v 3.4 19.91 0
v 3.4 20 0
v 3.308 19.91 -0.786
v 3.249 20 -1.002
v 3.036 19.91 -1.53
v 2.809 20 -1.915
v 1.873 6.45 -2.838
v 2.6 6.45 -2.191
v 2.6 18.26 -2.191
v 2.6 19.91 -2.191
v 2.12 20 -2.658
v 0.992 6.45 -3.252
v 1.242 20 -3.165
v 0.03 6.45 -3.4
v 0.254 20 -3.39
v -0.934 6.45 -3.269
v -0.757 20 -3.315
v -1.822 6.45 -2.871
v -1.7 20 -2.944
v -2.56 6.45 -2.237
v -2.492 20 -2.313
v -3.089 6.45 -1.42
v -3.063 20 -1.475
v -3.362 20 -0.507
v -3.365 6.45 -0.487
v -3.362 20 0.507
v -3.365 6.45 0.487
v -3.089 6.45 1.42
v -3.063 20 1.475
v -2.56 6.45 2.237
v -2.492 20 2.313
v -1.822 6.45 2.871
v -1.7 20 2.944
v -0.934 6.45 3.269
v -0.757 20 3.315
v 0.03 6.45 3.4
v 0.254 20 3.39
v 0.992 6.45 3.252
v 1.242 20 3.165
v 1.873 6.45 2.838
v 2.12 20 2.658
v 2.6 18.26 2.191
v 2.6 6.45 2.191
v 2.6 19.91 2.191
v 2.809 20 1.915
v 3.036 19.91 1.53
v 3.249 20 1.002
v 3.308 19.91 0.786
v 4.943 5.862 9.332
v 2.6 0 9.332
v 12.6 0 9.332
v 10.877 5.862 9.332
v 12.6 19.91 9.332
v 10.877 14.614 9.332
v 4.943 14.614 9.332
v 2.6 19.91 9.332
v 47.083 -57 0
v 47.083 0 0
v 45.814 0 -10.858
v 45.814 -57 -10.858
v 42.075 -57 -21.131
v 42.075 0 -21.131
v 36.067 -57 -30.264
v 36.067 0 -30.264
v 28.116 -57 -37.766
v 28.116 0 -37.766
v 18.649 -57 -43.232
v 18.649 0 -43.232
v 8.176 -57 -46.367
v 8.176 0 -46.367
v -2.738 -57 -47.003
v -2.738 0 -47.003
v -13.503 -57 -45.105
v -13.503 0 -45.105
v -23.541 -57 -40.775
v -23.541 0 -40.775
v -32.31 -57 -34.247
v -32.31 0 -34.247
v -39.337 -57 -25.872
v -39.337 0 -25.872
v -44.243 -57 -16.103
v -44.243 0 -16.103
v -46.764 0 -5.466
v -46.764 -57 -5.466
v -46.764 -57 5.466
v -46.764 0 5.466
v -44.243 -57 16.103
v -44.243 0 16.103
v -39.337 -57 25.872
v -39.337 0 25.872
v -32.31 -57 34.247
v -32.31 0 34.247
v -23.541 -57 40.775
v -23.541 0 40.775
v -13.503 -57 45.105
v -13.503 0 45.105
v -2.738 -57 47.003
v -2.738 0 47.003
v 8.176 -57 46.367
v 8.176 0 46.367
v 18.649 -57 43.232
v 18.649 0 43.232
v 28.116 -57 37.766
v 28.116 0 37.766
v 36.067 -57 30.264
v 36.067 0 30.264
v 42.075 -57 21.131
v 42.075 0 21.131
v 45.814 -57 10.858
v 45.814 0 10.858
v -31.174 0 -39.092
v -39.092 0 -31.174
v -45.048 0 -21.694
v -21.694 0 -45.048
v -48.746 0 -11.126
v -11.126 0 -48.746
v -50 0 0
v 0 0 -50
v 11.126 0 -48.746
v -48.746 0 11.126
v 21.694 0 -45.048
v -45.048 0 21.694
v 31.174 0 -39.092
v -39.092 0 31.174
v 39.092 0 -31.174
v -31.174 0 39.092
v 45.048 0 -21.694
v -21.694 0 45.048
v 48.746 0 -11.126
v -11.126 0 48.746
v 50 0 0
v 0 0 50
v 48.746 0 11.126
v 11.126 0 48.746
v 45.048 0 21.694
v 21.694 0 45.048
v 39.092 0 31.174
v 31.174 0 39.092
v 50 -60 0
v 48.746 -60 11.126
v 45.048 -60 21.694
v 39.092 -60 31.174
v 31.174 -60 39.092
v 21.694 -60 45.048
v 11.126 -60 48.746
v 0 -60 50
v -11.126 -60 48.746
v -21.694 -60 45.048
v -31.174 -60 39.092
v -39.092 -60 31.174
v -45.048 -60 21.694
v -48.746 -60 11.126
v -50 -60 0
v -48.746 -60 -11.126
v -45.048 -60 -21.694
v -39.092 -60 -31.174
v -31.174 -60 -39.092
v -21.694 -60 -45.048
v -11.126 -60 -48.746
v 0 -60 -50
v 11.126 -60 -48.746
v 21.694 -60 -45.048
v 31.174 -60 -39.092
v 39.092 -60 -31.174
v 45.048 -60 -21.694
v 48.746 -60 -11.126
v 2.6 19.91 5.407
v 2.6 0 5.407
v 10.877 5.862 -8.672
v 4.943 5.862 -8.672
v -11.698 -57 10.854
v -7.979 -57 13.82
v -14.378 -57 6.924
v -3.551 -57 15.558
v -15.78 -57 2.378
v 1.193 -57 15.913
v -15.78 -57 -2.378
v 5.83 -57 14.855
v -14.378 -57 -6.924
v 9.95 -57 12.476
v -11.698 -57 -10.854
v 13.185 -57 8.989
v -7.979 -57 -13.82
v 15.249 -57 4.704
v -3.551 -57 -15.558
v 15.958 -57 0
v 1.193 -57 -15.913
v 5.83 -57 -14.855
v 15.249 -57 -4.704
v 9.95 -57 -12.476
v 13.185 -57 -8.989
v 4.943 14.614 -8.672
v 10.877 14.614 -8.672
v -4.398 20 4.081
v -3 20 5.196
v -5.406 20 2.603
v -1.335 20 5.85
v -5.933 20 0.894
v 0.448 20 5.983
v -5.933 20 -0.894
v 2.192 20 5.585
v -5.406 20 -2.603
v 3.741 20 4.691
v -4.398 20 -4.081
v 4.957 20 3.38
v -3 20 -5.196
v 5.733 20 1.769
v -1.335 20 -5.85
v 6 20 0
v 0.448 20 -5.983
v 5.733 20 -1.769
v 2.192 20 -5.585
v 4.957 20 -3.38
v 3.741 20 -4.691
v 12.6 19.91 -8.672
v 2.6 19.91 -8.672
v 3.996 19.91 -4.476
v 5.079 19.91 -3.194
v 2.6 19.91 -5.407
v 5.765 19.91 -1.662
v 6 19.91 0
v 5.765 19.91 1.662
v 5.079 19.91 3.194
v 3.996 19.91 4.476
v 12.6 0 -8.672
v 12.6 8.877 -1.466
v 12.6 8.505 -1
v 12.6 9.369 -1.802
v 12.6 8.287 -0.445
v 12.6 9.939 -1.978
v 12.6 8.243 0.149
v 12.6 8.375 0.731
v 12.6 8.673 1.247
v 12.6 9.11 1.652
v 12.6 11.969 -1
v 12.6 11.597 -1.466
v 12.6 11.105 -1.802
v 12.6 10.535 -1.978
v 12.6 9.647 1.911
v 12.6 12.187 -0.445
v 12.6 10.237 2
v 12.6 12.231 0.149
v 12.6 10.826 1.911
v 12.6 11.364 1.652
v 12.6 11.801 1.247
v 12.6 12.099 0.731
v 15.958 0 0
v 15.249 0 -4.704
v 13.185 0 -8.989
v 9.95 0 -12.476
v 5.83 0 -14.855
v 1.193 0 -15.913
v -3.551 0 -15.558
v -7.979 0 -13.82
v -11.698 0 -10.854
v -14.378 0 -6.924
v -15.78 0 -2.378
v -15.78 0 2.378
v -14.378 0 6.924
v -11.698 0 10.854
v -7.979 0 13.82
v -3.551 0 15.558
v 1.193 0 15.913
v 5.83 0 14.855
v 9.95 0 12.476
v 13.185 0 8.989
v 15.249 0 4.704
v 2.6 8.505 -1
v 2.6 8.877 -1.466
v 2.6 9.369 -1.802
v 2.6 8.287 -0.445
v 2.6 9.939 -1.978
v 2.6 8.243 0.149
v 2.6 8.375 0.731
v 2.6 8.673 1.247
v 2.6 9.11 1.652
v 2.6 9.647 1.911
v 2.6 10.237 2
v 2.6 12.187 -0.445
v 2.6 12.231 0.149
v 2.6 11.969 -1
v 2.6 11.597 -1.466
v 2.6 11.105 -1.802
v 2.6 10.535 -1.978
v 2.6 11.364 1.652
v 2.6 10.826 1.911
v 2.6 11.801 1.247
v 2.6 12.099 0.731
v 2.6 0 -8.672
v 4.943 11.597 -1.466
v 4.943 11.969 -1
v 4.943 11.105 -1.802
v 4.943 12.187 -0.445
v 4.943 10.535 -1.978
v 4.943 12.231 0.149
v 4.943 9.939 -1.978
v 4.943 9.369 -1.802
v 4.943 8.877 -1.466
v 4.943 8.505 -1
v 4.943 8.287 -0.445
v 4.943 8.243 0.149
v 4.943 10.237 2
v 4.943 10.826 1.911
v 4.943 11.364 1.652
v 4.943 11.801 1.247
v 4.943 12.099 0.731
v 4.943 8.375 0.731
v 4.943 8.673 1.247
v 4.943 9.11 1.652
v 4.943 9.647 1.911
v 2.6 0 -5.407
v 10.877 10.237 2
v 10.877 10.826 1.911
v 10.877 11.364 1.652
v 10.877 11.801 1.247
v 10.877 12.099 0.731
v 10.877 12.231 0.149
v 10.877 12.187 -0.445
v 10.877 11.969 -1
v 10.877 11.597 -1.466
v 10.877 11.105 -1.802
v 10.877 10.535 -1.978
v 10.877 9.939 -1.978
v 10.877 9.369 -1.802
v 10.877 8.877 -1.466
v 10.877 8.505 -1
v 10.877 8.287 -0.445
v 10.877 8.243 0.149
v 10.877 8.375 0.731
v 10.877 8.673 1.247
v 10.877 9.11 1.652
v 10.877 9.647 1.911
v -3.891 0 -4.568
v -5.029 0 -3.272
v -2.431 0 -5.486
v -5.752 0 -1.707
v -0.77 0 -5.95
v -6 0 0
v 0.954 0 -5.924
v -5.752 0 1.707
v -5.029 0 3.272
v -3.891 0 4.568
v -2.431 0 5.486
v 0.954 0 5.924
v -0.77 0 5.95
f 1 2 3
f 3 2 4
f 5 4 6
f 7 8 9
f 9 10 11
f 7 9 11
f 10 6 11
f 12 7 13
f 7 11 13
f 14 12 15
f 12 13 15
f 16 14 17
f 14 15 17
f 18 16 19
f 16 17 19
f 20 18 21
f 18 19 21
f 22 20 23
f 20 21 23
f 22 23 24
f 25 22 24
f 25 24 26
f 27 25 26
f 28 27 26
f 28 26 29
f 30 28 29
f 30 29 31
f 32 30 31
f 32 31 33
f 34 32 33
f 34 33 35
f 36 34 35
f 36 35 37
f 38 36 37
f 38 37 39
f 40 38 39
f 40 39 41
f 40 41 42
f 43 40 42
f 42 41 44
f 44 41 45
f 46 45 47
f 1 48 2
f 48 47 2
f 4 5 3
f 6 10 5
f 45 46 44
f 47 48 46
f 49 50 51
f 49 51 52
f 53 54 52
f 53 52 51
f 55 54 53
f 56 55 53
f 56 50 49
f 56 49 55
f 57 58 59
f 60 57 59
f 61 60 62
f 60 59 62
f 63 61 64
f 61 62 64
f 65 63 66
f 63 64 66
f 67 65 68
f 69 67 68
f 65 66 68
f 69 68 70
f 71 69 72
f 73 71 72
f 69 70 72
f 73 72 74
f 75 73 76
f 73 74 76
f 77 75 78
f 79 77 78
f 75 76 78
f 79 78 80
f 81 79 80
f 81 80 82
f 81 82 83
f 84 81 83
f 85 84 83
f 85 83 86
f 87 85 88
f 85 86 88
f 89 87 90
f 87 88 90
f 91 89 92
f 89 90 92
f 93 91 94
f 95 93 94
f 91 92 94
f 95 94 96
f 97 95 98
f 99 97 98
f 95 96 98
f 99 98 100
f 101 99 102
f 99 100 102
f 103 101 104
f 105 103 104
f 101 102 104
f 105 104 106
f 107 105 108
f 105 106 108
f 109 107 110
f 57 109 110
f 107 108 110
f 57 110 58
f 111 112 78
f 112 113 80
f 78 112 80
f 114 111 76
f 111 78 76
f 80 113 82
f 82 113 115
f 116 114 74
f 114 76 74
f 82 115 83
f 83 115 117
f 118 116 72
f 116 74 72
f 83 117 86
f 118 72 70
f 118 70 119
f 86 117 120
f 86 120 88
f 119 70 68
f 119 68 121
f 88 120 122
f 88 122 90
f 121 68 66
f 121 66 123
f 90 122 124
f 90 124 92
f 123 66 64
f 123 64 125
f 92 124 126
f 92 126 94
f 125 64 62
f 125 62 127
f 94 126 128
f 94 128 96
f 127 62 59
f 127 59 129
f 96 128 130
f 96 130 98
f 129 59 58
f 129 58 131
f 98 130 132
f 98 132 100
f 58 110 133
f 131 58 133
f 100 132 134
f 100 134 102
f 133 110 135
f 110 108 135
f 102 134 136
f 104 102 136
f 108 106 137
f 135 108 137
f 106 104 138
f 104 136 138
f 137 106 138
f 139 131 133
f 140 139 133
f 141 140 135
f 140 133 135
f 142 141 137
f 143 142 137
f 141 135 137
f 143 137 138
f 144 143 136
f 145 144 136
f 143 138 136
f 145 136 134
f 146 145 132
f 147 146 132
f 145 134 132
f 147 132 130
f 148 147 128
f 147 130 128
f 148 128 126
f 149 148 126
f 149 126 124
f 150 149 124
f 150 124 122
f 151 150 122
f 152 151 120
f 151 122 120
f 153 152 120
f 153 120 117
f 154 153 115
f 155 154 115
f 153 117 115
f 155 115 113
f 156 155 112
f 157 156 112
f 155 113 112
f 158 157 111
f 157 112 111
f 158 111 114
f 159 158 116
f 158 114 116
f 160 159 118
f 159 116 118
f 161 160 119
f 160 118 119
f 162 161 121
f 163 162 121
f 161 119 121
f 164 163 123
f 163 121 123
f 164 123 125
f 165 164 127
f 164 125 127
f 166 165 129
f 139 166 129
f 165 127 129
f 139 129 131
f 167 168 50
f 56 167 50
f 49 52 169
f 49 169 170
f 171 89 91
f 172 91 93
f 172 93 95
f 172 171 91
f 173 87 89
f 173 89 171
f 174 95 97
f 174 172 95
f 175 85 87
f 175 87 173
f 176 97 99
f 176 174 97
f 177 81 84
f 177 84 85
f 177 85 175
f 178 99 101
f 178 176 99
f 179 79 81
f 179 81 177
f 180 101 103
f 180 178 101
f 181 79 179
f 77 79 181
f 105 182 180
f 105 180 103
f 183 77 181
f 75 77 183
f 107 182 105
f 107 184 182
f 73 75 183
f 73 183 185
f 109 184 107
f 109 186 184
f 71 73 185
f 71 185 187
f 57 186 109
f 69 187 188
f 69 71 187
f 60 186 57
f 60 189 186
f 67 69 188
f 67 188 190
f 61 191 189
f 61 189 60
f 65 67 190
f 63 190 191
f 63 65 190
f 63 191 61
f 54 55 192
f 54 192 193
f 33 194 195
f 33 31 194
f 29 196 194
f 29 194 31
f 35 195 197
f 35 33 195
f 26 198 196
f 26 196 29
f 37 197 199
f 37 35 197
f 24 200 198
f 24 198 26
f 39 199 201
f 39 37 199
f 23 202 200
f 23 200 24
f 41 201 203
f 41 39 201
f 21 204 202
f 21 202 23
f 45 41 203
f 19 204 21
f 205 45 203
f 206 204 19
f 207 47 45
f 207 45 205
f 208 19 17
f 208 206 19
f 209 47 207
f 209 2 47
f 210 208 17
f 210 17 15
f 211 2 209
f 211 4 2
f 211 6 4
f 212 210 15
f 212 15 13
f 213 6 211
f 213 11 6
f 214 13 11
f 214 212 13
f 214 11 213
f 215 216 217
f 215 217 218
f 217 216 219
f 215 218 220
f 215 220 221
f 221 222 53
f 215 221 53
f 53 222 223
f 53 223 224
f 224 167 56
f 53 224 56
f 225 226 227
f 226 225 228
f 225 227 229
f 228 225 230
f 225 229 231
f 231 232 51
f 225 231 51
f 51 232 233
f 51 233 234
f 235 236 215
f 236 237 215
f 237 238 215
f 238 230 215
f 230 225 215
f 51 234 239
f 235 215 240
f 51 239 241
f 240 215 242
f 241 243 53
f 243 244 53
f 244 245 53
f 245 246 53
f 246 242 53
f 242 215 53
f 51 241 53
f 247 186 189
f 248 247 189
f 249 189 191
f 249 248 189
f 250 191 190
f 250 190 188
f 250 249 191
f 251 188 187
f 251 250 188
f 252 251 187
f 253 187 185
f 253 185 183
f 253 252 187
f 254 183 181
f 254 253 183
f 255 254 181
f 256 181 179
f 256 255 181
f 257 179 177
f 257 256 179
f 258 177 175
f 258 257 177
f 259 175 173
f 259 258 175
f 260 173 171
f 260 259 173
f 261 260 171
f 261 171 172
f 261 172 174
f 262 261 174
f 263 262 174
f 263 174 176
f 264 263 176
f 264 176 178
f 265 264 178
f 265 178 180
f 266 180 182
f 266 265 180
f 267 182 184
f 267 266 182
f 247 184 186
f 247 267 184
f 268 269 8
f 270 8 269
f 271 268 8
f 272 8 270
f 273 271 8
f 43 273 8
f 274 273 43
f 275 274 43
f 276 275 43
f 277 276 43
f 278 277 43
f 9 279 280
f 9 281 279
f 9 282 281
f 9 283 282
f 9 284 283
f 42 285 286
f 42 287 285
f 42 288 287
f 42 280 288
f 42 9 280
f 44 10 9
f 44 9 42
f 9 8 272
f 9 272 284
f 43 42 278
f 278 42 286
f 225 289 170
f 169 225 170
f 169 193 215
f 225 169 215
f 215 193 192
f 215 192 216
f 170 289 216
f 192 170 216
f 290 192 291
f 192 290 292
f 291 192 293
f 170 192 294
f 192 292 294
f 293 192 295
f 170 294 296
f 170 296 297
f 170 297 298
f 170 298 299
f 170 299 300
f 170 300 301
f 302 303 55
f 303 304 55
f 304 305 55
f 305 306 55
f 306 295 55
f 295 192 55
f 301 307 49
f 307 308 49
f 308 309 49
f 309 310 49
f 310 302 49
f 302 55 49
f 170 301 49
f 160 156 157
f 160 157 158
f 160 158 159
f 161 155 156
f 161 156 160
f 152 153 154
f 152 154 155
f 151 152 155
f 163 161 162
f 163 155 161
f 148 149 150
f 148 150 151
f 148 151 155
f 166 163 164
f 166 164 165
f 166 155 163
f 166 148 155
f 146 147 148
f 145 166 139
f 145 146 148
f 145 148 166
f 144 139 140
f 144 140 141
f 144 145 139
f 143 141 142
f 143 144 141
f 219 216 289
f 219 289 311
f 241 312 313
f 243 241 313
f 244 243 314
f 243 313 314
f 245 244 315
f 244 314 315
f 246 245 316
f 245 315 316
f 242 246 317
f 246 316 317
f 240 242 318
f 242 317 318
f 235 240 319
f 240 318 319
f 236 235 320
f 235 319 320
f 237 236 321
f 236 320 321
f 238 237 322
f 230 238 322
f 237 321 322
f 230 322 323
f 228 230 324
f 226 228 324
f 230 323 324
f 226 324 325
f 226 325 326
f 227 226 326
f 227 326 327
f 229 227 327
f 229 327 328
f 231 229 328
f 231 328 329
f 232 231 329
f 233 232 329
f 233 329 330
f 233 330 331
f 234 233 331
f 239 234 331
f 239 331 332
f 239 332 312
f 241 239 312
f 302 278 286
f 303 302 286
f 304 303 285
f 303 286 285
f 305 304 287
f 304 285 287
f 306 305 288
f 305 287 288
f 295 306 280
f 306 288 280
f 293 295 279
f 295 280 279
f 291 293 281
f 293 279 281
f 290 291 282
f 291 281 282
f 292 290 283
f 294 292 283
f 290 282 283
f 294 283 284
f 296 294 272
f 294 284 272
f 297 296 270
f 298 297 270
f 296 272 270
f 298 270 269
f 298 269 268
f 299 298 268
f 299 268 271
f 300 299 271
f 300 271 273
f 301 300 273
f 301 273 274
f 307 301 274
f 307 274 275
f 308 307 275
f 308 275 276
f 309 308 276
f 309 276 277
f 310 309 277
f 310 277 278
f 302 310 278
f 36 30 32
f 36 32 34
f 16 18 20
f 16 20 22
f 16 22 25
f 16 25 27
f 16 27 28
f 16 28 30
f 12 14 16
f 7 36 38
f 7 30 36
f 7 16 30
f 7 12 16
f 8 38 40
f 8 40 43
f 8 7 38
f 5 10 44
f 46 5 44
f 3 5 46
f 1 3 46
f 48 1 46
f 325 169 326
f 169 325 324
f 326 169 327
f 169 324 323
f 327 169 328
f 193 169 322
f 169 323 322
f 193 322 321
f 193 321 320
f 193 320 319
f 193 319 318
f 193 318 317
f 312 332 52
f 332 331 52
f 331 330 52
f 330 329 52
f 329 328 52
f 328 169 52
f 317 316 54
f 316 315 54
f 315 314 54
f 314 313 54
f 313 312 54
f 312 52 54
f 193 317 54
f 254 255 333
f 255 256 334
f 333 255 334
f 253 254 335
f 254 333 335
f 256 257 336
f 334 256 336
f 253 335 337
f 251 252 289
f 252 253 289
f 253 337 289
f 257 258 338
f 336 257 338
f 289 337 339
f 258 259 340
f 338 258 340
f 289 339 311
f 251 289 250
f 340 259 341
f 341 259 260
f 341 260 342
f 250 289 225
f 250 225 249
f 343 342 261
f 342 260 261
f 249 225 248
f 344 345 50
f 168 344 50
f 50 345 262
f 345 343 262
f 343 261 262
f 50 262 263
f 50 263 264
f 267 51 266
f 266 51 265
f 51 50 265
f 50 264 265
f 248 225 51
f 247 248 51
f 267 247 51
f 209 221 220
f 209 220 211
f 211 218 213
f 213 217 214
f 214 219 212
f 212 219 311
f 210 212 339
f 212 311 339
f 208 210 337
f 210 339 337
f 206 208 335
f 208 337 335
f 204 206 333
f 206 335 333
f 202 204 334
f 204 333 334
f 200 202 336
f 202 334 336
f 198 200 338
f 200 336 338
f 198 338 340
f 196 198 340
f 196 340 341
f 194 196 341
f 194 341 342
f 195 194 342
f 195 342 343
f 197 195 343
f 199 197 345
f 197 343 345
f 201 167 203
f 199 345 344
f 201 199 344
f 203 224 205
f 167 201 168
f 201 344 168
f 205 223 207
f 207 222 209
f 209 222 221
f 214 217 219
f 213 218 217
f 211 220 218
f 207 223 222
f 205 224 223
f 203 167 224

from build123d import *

# Parameters (mm, degrees)
SKETCH1_R               = 6
BOSS_EXTRUDE1_DEPTH     = 20
SKETCH2_R               = 3.4
CUT_EXTRUDE1_DEPTH      = 13.55
SKETCH5_W               = 1.550685087
SKETCH5_H               = 7.184215806
BOSS_EXTRUDE2_DEPTH     = 13.55
SKETCH7_W               = 18.003976239
SKETCH7_H               = 19.909960041
BOSS_EXTRUDE3_DEPTH     = 10
CUT_EXTRUDE2_DEPTH      = 1
CUT_EXTRUDE2_DEPTH_BACK = 13.55
SKETCH6_R               = 2
CUT_EXTRUDE3_DEPTH      = 10
CUT_EXTRUDE3_DEPTH_BACK = 10
SKETCH10_R              = 50
BOSS_EXTRUDE4_DEPTH     = 60
SKETCH12_R              = 47.082764373
SKETCH12_R_2            = 15.95790089
CUT_EXTRUDE5_DEPTH      = 57


with BuildPart() as part:
    # Sketch1 → Boss-Extrude1 (new body)
    with BuildSketch(Plane(origin=(0, 0, 0), x_dir=(1, 0, 0), z_dir=(0, 1, 0))):
        Circle(SKETCH1_R)
    extrude(amount=BOSS_EXTRUDE1_DEPTH)

    # Sketch2 → Cut-Extrude1 (cut)
    with BuildSketch(Plane(origin=(0, 20, 0), x_dir=(1, 0, 0), z_dir=(0, 1, 0))):
        Circle(SKETCH2_R)
    extrude(amount=-CUT_EXTRUDE1_DEPTH, mode=Mode.SUBTRACT)

    # Sketch5 → Boss-Extrude2 (add)
    with BuildSketch(Plane(origin=(0, 18.26, 0), x_dir=(1, 0, 0), z_dir=(0, 1, 0))):
        with Locations((3.375342544, 0.020519704)):
            Rectangle(SKETCH5_W, SKETCH5_H)
    extrude(amount=-BOSS_EXTRUDE2_DEPTH)

    # Sketch7 → Boss-Extrude3 (add)
    with BuildSketch(Plane.ZY.offset(-2.6)):
        with Locations((0.33027221, 9.954980021)):
            Rectangle(SKETCH7_W, SKETCH7_H)
    extrude(amount=-BOSS_EXTRUDE3_DEPTH)

    # Sketch6 → Cut-Extrude2 (cut, two sides: drawn at the far end of the back side and taken through both)
    with BuildSketch(Plane.ZY.offset(-2.6).offset(-CUT_EXTRUDE2_DEPTH_BACK)):
        with Locations((0, 10.236925537)):
            Circle(SKETCH6_R)
    extrude(amount=CUT_EXTRUDE2_DEPTH + CUT_EXTRUDE2_DEPTH_BACK, mode=Mode.SUBTRACT)

    # Sketch9 → Cut-Extrude3 (cut, two sides: drawn at the far end of the back side and taken through both)
    with BuildSketch(Plane.XY.offset(-CUT_EXTRUDE3_DEPTH_BACK)):
        Polygon((10.876516382, 10.236925537), (10.876516382, 5.861925537), (4.943430227, 5.861925537), (4.943430227, 10.236925537), (4.943430227, 14.614332445), (10.876516382, 14.614332445), align=None)
    extrude(amount=CUT_EXTRUDE3_DEPTH + CUT_EXTRUDE3_DEPTH_BACK, mode=Mode.SUBTRACT)

    # Sketch10 → Boss-Extrude4 (add)
    with BuildSketch(Plane.XZ):
        Circle(SKETCH10_R)
    extrude(amount=BOSS_EXTRUDE4_DEPTH)

    # Sketch12 → Cut-Extrude5 (cut)
    with BuildSketch(Plane(origin=(0, 0, 0), x_dir=(1, 0, 0), z_dir=(0, 1, 0))):
        Circle(SKETCH12_R)
        Circle(SKETCH12_R_2, mode=Mode.SUBTRACT)
    extrude(amount=-CUT_EXTRUDE5_DEPTH, mode=Mode.SUBTRACT)


solid = part.part
